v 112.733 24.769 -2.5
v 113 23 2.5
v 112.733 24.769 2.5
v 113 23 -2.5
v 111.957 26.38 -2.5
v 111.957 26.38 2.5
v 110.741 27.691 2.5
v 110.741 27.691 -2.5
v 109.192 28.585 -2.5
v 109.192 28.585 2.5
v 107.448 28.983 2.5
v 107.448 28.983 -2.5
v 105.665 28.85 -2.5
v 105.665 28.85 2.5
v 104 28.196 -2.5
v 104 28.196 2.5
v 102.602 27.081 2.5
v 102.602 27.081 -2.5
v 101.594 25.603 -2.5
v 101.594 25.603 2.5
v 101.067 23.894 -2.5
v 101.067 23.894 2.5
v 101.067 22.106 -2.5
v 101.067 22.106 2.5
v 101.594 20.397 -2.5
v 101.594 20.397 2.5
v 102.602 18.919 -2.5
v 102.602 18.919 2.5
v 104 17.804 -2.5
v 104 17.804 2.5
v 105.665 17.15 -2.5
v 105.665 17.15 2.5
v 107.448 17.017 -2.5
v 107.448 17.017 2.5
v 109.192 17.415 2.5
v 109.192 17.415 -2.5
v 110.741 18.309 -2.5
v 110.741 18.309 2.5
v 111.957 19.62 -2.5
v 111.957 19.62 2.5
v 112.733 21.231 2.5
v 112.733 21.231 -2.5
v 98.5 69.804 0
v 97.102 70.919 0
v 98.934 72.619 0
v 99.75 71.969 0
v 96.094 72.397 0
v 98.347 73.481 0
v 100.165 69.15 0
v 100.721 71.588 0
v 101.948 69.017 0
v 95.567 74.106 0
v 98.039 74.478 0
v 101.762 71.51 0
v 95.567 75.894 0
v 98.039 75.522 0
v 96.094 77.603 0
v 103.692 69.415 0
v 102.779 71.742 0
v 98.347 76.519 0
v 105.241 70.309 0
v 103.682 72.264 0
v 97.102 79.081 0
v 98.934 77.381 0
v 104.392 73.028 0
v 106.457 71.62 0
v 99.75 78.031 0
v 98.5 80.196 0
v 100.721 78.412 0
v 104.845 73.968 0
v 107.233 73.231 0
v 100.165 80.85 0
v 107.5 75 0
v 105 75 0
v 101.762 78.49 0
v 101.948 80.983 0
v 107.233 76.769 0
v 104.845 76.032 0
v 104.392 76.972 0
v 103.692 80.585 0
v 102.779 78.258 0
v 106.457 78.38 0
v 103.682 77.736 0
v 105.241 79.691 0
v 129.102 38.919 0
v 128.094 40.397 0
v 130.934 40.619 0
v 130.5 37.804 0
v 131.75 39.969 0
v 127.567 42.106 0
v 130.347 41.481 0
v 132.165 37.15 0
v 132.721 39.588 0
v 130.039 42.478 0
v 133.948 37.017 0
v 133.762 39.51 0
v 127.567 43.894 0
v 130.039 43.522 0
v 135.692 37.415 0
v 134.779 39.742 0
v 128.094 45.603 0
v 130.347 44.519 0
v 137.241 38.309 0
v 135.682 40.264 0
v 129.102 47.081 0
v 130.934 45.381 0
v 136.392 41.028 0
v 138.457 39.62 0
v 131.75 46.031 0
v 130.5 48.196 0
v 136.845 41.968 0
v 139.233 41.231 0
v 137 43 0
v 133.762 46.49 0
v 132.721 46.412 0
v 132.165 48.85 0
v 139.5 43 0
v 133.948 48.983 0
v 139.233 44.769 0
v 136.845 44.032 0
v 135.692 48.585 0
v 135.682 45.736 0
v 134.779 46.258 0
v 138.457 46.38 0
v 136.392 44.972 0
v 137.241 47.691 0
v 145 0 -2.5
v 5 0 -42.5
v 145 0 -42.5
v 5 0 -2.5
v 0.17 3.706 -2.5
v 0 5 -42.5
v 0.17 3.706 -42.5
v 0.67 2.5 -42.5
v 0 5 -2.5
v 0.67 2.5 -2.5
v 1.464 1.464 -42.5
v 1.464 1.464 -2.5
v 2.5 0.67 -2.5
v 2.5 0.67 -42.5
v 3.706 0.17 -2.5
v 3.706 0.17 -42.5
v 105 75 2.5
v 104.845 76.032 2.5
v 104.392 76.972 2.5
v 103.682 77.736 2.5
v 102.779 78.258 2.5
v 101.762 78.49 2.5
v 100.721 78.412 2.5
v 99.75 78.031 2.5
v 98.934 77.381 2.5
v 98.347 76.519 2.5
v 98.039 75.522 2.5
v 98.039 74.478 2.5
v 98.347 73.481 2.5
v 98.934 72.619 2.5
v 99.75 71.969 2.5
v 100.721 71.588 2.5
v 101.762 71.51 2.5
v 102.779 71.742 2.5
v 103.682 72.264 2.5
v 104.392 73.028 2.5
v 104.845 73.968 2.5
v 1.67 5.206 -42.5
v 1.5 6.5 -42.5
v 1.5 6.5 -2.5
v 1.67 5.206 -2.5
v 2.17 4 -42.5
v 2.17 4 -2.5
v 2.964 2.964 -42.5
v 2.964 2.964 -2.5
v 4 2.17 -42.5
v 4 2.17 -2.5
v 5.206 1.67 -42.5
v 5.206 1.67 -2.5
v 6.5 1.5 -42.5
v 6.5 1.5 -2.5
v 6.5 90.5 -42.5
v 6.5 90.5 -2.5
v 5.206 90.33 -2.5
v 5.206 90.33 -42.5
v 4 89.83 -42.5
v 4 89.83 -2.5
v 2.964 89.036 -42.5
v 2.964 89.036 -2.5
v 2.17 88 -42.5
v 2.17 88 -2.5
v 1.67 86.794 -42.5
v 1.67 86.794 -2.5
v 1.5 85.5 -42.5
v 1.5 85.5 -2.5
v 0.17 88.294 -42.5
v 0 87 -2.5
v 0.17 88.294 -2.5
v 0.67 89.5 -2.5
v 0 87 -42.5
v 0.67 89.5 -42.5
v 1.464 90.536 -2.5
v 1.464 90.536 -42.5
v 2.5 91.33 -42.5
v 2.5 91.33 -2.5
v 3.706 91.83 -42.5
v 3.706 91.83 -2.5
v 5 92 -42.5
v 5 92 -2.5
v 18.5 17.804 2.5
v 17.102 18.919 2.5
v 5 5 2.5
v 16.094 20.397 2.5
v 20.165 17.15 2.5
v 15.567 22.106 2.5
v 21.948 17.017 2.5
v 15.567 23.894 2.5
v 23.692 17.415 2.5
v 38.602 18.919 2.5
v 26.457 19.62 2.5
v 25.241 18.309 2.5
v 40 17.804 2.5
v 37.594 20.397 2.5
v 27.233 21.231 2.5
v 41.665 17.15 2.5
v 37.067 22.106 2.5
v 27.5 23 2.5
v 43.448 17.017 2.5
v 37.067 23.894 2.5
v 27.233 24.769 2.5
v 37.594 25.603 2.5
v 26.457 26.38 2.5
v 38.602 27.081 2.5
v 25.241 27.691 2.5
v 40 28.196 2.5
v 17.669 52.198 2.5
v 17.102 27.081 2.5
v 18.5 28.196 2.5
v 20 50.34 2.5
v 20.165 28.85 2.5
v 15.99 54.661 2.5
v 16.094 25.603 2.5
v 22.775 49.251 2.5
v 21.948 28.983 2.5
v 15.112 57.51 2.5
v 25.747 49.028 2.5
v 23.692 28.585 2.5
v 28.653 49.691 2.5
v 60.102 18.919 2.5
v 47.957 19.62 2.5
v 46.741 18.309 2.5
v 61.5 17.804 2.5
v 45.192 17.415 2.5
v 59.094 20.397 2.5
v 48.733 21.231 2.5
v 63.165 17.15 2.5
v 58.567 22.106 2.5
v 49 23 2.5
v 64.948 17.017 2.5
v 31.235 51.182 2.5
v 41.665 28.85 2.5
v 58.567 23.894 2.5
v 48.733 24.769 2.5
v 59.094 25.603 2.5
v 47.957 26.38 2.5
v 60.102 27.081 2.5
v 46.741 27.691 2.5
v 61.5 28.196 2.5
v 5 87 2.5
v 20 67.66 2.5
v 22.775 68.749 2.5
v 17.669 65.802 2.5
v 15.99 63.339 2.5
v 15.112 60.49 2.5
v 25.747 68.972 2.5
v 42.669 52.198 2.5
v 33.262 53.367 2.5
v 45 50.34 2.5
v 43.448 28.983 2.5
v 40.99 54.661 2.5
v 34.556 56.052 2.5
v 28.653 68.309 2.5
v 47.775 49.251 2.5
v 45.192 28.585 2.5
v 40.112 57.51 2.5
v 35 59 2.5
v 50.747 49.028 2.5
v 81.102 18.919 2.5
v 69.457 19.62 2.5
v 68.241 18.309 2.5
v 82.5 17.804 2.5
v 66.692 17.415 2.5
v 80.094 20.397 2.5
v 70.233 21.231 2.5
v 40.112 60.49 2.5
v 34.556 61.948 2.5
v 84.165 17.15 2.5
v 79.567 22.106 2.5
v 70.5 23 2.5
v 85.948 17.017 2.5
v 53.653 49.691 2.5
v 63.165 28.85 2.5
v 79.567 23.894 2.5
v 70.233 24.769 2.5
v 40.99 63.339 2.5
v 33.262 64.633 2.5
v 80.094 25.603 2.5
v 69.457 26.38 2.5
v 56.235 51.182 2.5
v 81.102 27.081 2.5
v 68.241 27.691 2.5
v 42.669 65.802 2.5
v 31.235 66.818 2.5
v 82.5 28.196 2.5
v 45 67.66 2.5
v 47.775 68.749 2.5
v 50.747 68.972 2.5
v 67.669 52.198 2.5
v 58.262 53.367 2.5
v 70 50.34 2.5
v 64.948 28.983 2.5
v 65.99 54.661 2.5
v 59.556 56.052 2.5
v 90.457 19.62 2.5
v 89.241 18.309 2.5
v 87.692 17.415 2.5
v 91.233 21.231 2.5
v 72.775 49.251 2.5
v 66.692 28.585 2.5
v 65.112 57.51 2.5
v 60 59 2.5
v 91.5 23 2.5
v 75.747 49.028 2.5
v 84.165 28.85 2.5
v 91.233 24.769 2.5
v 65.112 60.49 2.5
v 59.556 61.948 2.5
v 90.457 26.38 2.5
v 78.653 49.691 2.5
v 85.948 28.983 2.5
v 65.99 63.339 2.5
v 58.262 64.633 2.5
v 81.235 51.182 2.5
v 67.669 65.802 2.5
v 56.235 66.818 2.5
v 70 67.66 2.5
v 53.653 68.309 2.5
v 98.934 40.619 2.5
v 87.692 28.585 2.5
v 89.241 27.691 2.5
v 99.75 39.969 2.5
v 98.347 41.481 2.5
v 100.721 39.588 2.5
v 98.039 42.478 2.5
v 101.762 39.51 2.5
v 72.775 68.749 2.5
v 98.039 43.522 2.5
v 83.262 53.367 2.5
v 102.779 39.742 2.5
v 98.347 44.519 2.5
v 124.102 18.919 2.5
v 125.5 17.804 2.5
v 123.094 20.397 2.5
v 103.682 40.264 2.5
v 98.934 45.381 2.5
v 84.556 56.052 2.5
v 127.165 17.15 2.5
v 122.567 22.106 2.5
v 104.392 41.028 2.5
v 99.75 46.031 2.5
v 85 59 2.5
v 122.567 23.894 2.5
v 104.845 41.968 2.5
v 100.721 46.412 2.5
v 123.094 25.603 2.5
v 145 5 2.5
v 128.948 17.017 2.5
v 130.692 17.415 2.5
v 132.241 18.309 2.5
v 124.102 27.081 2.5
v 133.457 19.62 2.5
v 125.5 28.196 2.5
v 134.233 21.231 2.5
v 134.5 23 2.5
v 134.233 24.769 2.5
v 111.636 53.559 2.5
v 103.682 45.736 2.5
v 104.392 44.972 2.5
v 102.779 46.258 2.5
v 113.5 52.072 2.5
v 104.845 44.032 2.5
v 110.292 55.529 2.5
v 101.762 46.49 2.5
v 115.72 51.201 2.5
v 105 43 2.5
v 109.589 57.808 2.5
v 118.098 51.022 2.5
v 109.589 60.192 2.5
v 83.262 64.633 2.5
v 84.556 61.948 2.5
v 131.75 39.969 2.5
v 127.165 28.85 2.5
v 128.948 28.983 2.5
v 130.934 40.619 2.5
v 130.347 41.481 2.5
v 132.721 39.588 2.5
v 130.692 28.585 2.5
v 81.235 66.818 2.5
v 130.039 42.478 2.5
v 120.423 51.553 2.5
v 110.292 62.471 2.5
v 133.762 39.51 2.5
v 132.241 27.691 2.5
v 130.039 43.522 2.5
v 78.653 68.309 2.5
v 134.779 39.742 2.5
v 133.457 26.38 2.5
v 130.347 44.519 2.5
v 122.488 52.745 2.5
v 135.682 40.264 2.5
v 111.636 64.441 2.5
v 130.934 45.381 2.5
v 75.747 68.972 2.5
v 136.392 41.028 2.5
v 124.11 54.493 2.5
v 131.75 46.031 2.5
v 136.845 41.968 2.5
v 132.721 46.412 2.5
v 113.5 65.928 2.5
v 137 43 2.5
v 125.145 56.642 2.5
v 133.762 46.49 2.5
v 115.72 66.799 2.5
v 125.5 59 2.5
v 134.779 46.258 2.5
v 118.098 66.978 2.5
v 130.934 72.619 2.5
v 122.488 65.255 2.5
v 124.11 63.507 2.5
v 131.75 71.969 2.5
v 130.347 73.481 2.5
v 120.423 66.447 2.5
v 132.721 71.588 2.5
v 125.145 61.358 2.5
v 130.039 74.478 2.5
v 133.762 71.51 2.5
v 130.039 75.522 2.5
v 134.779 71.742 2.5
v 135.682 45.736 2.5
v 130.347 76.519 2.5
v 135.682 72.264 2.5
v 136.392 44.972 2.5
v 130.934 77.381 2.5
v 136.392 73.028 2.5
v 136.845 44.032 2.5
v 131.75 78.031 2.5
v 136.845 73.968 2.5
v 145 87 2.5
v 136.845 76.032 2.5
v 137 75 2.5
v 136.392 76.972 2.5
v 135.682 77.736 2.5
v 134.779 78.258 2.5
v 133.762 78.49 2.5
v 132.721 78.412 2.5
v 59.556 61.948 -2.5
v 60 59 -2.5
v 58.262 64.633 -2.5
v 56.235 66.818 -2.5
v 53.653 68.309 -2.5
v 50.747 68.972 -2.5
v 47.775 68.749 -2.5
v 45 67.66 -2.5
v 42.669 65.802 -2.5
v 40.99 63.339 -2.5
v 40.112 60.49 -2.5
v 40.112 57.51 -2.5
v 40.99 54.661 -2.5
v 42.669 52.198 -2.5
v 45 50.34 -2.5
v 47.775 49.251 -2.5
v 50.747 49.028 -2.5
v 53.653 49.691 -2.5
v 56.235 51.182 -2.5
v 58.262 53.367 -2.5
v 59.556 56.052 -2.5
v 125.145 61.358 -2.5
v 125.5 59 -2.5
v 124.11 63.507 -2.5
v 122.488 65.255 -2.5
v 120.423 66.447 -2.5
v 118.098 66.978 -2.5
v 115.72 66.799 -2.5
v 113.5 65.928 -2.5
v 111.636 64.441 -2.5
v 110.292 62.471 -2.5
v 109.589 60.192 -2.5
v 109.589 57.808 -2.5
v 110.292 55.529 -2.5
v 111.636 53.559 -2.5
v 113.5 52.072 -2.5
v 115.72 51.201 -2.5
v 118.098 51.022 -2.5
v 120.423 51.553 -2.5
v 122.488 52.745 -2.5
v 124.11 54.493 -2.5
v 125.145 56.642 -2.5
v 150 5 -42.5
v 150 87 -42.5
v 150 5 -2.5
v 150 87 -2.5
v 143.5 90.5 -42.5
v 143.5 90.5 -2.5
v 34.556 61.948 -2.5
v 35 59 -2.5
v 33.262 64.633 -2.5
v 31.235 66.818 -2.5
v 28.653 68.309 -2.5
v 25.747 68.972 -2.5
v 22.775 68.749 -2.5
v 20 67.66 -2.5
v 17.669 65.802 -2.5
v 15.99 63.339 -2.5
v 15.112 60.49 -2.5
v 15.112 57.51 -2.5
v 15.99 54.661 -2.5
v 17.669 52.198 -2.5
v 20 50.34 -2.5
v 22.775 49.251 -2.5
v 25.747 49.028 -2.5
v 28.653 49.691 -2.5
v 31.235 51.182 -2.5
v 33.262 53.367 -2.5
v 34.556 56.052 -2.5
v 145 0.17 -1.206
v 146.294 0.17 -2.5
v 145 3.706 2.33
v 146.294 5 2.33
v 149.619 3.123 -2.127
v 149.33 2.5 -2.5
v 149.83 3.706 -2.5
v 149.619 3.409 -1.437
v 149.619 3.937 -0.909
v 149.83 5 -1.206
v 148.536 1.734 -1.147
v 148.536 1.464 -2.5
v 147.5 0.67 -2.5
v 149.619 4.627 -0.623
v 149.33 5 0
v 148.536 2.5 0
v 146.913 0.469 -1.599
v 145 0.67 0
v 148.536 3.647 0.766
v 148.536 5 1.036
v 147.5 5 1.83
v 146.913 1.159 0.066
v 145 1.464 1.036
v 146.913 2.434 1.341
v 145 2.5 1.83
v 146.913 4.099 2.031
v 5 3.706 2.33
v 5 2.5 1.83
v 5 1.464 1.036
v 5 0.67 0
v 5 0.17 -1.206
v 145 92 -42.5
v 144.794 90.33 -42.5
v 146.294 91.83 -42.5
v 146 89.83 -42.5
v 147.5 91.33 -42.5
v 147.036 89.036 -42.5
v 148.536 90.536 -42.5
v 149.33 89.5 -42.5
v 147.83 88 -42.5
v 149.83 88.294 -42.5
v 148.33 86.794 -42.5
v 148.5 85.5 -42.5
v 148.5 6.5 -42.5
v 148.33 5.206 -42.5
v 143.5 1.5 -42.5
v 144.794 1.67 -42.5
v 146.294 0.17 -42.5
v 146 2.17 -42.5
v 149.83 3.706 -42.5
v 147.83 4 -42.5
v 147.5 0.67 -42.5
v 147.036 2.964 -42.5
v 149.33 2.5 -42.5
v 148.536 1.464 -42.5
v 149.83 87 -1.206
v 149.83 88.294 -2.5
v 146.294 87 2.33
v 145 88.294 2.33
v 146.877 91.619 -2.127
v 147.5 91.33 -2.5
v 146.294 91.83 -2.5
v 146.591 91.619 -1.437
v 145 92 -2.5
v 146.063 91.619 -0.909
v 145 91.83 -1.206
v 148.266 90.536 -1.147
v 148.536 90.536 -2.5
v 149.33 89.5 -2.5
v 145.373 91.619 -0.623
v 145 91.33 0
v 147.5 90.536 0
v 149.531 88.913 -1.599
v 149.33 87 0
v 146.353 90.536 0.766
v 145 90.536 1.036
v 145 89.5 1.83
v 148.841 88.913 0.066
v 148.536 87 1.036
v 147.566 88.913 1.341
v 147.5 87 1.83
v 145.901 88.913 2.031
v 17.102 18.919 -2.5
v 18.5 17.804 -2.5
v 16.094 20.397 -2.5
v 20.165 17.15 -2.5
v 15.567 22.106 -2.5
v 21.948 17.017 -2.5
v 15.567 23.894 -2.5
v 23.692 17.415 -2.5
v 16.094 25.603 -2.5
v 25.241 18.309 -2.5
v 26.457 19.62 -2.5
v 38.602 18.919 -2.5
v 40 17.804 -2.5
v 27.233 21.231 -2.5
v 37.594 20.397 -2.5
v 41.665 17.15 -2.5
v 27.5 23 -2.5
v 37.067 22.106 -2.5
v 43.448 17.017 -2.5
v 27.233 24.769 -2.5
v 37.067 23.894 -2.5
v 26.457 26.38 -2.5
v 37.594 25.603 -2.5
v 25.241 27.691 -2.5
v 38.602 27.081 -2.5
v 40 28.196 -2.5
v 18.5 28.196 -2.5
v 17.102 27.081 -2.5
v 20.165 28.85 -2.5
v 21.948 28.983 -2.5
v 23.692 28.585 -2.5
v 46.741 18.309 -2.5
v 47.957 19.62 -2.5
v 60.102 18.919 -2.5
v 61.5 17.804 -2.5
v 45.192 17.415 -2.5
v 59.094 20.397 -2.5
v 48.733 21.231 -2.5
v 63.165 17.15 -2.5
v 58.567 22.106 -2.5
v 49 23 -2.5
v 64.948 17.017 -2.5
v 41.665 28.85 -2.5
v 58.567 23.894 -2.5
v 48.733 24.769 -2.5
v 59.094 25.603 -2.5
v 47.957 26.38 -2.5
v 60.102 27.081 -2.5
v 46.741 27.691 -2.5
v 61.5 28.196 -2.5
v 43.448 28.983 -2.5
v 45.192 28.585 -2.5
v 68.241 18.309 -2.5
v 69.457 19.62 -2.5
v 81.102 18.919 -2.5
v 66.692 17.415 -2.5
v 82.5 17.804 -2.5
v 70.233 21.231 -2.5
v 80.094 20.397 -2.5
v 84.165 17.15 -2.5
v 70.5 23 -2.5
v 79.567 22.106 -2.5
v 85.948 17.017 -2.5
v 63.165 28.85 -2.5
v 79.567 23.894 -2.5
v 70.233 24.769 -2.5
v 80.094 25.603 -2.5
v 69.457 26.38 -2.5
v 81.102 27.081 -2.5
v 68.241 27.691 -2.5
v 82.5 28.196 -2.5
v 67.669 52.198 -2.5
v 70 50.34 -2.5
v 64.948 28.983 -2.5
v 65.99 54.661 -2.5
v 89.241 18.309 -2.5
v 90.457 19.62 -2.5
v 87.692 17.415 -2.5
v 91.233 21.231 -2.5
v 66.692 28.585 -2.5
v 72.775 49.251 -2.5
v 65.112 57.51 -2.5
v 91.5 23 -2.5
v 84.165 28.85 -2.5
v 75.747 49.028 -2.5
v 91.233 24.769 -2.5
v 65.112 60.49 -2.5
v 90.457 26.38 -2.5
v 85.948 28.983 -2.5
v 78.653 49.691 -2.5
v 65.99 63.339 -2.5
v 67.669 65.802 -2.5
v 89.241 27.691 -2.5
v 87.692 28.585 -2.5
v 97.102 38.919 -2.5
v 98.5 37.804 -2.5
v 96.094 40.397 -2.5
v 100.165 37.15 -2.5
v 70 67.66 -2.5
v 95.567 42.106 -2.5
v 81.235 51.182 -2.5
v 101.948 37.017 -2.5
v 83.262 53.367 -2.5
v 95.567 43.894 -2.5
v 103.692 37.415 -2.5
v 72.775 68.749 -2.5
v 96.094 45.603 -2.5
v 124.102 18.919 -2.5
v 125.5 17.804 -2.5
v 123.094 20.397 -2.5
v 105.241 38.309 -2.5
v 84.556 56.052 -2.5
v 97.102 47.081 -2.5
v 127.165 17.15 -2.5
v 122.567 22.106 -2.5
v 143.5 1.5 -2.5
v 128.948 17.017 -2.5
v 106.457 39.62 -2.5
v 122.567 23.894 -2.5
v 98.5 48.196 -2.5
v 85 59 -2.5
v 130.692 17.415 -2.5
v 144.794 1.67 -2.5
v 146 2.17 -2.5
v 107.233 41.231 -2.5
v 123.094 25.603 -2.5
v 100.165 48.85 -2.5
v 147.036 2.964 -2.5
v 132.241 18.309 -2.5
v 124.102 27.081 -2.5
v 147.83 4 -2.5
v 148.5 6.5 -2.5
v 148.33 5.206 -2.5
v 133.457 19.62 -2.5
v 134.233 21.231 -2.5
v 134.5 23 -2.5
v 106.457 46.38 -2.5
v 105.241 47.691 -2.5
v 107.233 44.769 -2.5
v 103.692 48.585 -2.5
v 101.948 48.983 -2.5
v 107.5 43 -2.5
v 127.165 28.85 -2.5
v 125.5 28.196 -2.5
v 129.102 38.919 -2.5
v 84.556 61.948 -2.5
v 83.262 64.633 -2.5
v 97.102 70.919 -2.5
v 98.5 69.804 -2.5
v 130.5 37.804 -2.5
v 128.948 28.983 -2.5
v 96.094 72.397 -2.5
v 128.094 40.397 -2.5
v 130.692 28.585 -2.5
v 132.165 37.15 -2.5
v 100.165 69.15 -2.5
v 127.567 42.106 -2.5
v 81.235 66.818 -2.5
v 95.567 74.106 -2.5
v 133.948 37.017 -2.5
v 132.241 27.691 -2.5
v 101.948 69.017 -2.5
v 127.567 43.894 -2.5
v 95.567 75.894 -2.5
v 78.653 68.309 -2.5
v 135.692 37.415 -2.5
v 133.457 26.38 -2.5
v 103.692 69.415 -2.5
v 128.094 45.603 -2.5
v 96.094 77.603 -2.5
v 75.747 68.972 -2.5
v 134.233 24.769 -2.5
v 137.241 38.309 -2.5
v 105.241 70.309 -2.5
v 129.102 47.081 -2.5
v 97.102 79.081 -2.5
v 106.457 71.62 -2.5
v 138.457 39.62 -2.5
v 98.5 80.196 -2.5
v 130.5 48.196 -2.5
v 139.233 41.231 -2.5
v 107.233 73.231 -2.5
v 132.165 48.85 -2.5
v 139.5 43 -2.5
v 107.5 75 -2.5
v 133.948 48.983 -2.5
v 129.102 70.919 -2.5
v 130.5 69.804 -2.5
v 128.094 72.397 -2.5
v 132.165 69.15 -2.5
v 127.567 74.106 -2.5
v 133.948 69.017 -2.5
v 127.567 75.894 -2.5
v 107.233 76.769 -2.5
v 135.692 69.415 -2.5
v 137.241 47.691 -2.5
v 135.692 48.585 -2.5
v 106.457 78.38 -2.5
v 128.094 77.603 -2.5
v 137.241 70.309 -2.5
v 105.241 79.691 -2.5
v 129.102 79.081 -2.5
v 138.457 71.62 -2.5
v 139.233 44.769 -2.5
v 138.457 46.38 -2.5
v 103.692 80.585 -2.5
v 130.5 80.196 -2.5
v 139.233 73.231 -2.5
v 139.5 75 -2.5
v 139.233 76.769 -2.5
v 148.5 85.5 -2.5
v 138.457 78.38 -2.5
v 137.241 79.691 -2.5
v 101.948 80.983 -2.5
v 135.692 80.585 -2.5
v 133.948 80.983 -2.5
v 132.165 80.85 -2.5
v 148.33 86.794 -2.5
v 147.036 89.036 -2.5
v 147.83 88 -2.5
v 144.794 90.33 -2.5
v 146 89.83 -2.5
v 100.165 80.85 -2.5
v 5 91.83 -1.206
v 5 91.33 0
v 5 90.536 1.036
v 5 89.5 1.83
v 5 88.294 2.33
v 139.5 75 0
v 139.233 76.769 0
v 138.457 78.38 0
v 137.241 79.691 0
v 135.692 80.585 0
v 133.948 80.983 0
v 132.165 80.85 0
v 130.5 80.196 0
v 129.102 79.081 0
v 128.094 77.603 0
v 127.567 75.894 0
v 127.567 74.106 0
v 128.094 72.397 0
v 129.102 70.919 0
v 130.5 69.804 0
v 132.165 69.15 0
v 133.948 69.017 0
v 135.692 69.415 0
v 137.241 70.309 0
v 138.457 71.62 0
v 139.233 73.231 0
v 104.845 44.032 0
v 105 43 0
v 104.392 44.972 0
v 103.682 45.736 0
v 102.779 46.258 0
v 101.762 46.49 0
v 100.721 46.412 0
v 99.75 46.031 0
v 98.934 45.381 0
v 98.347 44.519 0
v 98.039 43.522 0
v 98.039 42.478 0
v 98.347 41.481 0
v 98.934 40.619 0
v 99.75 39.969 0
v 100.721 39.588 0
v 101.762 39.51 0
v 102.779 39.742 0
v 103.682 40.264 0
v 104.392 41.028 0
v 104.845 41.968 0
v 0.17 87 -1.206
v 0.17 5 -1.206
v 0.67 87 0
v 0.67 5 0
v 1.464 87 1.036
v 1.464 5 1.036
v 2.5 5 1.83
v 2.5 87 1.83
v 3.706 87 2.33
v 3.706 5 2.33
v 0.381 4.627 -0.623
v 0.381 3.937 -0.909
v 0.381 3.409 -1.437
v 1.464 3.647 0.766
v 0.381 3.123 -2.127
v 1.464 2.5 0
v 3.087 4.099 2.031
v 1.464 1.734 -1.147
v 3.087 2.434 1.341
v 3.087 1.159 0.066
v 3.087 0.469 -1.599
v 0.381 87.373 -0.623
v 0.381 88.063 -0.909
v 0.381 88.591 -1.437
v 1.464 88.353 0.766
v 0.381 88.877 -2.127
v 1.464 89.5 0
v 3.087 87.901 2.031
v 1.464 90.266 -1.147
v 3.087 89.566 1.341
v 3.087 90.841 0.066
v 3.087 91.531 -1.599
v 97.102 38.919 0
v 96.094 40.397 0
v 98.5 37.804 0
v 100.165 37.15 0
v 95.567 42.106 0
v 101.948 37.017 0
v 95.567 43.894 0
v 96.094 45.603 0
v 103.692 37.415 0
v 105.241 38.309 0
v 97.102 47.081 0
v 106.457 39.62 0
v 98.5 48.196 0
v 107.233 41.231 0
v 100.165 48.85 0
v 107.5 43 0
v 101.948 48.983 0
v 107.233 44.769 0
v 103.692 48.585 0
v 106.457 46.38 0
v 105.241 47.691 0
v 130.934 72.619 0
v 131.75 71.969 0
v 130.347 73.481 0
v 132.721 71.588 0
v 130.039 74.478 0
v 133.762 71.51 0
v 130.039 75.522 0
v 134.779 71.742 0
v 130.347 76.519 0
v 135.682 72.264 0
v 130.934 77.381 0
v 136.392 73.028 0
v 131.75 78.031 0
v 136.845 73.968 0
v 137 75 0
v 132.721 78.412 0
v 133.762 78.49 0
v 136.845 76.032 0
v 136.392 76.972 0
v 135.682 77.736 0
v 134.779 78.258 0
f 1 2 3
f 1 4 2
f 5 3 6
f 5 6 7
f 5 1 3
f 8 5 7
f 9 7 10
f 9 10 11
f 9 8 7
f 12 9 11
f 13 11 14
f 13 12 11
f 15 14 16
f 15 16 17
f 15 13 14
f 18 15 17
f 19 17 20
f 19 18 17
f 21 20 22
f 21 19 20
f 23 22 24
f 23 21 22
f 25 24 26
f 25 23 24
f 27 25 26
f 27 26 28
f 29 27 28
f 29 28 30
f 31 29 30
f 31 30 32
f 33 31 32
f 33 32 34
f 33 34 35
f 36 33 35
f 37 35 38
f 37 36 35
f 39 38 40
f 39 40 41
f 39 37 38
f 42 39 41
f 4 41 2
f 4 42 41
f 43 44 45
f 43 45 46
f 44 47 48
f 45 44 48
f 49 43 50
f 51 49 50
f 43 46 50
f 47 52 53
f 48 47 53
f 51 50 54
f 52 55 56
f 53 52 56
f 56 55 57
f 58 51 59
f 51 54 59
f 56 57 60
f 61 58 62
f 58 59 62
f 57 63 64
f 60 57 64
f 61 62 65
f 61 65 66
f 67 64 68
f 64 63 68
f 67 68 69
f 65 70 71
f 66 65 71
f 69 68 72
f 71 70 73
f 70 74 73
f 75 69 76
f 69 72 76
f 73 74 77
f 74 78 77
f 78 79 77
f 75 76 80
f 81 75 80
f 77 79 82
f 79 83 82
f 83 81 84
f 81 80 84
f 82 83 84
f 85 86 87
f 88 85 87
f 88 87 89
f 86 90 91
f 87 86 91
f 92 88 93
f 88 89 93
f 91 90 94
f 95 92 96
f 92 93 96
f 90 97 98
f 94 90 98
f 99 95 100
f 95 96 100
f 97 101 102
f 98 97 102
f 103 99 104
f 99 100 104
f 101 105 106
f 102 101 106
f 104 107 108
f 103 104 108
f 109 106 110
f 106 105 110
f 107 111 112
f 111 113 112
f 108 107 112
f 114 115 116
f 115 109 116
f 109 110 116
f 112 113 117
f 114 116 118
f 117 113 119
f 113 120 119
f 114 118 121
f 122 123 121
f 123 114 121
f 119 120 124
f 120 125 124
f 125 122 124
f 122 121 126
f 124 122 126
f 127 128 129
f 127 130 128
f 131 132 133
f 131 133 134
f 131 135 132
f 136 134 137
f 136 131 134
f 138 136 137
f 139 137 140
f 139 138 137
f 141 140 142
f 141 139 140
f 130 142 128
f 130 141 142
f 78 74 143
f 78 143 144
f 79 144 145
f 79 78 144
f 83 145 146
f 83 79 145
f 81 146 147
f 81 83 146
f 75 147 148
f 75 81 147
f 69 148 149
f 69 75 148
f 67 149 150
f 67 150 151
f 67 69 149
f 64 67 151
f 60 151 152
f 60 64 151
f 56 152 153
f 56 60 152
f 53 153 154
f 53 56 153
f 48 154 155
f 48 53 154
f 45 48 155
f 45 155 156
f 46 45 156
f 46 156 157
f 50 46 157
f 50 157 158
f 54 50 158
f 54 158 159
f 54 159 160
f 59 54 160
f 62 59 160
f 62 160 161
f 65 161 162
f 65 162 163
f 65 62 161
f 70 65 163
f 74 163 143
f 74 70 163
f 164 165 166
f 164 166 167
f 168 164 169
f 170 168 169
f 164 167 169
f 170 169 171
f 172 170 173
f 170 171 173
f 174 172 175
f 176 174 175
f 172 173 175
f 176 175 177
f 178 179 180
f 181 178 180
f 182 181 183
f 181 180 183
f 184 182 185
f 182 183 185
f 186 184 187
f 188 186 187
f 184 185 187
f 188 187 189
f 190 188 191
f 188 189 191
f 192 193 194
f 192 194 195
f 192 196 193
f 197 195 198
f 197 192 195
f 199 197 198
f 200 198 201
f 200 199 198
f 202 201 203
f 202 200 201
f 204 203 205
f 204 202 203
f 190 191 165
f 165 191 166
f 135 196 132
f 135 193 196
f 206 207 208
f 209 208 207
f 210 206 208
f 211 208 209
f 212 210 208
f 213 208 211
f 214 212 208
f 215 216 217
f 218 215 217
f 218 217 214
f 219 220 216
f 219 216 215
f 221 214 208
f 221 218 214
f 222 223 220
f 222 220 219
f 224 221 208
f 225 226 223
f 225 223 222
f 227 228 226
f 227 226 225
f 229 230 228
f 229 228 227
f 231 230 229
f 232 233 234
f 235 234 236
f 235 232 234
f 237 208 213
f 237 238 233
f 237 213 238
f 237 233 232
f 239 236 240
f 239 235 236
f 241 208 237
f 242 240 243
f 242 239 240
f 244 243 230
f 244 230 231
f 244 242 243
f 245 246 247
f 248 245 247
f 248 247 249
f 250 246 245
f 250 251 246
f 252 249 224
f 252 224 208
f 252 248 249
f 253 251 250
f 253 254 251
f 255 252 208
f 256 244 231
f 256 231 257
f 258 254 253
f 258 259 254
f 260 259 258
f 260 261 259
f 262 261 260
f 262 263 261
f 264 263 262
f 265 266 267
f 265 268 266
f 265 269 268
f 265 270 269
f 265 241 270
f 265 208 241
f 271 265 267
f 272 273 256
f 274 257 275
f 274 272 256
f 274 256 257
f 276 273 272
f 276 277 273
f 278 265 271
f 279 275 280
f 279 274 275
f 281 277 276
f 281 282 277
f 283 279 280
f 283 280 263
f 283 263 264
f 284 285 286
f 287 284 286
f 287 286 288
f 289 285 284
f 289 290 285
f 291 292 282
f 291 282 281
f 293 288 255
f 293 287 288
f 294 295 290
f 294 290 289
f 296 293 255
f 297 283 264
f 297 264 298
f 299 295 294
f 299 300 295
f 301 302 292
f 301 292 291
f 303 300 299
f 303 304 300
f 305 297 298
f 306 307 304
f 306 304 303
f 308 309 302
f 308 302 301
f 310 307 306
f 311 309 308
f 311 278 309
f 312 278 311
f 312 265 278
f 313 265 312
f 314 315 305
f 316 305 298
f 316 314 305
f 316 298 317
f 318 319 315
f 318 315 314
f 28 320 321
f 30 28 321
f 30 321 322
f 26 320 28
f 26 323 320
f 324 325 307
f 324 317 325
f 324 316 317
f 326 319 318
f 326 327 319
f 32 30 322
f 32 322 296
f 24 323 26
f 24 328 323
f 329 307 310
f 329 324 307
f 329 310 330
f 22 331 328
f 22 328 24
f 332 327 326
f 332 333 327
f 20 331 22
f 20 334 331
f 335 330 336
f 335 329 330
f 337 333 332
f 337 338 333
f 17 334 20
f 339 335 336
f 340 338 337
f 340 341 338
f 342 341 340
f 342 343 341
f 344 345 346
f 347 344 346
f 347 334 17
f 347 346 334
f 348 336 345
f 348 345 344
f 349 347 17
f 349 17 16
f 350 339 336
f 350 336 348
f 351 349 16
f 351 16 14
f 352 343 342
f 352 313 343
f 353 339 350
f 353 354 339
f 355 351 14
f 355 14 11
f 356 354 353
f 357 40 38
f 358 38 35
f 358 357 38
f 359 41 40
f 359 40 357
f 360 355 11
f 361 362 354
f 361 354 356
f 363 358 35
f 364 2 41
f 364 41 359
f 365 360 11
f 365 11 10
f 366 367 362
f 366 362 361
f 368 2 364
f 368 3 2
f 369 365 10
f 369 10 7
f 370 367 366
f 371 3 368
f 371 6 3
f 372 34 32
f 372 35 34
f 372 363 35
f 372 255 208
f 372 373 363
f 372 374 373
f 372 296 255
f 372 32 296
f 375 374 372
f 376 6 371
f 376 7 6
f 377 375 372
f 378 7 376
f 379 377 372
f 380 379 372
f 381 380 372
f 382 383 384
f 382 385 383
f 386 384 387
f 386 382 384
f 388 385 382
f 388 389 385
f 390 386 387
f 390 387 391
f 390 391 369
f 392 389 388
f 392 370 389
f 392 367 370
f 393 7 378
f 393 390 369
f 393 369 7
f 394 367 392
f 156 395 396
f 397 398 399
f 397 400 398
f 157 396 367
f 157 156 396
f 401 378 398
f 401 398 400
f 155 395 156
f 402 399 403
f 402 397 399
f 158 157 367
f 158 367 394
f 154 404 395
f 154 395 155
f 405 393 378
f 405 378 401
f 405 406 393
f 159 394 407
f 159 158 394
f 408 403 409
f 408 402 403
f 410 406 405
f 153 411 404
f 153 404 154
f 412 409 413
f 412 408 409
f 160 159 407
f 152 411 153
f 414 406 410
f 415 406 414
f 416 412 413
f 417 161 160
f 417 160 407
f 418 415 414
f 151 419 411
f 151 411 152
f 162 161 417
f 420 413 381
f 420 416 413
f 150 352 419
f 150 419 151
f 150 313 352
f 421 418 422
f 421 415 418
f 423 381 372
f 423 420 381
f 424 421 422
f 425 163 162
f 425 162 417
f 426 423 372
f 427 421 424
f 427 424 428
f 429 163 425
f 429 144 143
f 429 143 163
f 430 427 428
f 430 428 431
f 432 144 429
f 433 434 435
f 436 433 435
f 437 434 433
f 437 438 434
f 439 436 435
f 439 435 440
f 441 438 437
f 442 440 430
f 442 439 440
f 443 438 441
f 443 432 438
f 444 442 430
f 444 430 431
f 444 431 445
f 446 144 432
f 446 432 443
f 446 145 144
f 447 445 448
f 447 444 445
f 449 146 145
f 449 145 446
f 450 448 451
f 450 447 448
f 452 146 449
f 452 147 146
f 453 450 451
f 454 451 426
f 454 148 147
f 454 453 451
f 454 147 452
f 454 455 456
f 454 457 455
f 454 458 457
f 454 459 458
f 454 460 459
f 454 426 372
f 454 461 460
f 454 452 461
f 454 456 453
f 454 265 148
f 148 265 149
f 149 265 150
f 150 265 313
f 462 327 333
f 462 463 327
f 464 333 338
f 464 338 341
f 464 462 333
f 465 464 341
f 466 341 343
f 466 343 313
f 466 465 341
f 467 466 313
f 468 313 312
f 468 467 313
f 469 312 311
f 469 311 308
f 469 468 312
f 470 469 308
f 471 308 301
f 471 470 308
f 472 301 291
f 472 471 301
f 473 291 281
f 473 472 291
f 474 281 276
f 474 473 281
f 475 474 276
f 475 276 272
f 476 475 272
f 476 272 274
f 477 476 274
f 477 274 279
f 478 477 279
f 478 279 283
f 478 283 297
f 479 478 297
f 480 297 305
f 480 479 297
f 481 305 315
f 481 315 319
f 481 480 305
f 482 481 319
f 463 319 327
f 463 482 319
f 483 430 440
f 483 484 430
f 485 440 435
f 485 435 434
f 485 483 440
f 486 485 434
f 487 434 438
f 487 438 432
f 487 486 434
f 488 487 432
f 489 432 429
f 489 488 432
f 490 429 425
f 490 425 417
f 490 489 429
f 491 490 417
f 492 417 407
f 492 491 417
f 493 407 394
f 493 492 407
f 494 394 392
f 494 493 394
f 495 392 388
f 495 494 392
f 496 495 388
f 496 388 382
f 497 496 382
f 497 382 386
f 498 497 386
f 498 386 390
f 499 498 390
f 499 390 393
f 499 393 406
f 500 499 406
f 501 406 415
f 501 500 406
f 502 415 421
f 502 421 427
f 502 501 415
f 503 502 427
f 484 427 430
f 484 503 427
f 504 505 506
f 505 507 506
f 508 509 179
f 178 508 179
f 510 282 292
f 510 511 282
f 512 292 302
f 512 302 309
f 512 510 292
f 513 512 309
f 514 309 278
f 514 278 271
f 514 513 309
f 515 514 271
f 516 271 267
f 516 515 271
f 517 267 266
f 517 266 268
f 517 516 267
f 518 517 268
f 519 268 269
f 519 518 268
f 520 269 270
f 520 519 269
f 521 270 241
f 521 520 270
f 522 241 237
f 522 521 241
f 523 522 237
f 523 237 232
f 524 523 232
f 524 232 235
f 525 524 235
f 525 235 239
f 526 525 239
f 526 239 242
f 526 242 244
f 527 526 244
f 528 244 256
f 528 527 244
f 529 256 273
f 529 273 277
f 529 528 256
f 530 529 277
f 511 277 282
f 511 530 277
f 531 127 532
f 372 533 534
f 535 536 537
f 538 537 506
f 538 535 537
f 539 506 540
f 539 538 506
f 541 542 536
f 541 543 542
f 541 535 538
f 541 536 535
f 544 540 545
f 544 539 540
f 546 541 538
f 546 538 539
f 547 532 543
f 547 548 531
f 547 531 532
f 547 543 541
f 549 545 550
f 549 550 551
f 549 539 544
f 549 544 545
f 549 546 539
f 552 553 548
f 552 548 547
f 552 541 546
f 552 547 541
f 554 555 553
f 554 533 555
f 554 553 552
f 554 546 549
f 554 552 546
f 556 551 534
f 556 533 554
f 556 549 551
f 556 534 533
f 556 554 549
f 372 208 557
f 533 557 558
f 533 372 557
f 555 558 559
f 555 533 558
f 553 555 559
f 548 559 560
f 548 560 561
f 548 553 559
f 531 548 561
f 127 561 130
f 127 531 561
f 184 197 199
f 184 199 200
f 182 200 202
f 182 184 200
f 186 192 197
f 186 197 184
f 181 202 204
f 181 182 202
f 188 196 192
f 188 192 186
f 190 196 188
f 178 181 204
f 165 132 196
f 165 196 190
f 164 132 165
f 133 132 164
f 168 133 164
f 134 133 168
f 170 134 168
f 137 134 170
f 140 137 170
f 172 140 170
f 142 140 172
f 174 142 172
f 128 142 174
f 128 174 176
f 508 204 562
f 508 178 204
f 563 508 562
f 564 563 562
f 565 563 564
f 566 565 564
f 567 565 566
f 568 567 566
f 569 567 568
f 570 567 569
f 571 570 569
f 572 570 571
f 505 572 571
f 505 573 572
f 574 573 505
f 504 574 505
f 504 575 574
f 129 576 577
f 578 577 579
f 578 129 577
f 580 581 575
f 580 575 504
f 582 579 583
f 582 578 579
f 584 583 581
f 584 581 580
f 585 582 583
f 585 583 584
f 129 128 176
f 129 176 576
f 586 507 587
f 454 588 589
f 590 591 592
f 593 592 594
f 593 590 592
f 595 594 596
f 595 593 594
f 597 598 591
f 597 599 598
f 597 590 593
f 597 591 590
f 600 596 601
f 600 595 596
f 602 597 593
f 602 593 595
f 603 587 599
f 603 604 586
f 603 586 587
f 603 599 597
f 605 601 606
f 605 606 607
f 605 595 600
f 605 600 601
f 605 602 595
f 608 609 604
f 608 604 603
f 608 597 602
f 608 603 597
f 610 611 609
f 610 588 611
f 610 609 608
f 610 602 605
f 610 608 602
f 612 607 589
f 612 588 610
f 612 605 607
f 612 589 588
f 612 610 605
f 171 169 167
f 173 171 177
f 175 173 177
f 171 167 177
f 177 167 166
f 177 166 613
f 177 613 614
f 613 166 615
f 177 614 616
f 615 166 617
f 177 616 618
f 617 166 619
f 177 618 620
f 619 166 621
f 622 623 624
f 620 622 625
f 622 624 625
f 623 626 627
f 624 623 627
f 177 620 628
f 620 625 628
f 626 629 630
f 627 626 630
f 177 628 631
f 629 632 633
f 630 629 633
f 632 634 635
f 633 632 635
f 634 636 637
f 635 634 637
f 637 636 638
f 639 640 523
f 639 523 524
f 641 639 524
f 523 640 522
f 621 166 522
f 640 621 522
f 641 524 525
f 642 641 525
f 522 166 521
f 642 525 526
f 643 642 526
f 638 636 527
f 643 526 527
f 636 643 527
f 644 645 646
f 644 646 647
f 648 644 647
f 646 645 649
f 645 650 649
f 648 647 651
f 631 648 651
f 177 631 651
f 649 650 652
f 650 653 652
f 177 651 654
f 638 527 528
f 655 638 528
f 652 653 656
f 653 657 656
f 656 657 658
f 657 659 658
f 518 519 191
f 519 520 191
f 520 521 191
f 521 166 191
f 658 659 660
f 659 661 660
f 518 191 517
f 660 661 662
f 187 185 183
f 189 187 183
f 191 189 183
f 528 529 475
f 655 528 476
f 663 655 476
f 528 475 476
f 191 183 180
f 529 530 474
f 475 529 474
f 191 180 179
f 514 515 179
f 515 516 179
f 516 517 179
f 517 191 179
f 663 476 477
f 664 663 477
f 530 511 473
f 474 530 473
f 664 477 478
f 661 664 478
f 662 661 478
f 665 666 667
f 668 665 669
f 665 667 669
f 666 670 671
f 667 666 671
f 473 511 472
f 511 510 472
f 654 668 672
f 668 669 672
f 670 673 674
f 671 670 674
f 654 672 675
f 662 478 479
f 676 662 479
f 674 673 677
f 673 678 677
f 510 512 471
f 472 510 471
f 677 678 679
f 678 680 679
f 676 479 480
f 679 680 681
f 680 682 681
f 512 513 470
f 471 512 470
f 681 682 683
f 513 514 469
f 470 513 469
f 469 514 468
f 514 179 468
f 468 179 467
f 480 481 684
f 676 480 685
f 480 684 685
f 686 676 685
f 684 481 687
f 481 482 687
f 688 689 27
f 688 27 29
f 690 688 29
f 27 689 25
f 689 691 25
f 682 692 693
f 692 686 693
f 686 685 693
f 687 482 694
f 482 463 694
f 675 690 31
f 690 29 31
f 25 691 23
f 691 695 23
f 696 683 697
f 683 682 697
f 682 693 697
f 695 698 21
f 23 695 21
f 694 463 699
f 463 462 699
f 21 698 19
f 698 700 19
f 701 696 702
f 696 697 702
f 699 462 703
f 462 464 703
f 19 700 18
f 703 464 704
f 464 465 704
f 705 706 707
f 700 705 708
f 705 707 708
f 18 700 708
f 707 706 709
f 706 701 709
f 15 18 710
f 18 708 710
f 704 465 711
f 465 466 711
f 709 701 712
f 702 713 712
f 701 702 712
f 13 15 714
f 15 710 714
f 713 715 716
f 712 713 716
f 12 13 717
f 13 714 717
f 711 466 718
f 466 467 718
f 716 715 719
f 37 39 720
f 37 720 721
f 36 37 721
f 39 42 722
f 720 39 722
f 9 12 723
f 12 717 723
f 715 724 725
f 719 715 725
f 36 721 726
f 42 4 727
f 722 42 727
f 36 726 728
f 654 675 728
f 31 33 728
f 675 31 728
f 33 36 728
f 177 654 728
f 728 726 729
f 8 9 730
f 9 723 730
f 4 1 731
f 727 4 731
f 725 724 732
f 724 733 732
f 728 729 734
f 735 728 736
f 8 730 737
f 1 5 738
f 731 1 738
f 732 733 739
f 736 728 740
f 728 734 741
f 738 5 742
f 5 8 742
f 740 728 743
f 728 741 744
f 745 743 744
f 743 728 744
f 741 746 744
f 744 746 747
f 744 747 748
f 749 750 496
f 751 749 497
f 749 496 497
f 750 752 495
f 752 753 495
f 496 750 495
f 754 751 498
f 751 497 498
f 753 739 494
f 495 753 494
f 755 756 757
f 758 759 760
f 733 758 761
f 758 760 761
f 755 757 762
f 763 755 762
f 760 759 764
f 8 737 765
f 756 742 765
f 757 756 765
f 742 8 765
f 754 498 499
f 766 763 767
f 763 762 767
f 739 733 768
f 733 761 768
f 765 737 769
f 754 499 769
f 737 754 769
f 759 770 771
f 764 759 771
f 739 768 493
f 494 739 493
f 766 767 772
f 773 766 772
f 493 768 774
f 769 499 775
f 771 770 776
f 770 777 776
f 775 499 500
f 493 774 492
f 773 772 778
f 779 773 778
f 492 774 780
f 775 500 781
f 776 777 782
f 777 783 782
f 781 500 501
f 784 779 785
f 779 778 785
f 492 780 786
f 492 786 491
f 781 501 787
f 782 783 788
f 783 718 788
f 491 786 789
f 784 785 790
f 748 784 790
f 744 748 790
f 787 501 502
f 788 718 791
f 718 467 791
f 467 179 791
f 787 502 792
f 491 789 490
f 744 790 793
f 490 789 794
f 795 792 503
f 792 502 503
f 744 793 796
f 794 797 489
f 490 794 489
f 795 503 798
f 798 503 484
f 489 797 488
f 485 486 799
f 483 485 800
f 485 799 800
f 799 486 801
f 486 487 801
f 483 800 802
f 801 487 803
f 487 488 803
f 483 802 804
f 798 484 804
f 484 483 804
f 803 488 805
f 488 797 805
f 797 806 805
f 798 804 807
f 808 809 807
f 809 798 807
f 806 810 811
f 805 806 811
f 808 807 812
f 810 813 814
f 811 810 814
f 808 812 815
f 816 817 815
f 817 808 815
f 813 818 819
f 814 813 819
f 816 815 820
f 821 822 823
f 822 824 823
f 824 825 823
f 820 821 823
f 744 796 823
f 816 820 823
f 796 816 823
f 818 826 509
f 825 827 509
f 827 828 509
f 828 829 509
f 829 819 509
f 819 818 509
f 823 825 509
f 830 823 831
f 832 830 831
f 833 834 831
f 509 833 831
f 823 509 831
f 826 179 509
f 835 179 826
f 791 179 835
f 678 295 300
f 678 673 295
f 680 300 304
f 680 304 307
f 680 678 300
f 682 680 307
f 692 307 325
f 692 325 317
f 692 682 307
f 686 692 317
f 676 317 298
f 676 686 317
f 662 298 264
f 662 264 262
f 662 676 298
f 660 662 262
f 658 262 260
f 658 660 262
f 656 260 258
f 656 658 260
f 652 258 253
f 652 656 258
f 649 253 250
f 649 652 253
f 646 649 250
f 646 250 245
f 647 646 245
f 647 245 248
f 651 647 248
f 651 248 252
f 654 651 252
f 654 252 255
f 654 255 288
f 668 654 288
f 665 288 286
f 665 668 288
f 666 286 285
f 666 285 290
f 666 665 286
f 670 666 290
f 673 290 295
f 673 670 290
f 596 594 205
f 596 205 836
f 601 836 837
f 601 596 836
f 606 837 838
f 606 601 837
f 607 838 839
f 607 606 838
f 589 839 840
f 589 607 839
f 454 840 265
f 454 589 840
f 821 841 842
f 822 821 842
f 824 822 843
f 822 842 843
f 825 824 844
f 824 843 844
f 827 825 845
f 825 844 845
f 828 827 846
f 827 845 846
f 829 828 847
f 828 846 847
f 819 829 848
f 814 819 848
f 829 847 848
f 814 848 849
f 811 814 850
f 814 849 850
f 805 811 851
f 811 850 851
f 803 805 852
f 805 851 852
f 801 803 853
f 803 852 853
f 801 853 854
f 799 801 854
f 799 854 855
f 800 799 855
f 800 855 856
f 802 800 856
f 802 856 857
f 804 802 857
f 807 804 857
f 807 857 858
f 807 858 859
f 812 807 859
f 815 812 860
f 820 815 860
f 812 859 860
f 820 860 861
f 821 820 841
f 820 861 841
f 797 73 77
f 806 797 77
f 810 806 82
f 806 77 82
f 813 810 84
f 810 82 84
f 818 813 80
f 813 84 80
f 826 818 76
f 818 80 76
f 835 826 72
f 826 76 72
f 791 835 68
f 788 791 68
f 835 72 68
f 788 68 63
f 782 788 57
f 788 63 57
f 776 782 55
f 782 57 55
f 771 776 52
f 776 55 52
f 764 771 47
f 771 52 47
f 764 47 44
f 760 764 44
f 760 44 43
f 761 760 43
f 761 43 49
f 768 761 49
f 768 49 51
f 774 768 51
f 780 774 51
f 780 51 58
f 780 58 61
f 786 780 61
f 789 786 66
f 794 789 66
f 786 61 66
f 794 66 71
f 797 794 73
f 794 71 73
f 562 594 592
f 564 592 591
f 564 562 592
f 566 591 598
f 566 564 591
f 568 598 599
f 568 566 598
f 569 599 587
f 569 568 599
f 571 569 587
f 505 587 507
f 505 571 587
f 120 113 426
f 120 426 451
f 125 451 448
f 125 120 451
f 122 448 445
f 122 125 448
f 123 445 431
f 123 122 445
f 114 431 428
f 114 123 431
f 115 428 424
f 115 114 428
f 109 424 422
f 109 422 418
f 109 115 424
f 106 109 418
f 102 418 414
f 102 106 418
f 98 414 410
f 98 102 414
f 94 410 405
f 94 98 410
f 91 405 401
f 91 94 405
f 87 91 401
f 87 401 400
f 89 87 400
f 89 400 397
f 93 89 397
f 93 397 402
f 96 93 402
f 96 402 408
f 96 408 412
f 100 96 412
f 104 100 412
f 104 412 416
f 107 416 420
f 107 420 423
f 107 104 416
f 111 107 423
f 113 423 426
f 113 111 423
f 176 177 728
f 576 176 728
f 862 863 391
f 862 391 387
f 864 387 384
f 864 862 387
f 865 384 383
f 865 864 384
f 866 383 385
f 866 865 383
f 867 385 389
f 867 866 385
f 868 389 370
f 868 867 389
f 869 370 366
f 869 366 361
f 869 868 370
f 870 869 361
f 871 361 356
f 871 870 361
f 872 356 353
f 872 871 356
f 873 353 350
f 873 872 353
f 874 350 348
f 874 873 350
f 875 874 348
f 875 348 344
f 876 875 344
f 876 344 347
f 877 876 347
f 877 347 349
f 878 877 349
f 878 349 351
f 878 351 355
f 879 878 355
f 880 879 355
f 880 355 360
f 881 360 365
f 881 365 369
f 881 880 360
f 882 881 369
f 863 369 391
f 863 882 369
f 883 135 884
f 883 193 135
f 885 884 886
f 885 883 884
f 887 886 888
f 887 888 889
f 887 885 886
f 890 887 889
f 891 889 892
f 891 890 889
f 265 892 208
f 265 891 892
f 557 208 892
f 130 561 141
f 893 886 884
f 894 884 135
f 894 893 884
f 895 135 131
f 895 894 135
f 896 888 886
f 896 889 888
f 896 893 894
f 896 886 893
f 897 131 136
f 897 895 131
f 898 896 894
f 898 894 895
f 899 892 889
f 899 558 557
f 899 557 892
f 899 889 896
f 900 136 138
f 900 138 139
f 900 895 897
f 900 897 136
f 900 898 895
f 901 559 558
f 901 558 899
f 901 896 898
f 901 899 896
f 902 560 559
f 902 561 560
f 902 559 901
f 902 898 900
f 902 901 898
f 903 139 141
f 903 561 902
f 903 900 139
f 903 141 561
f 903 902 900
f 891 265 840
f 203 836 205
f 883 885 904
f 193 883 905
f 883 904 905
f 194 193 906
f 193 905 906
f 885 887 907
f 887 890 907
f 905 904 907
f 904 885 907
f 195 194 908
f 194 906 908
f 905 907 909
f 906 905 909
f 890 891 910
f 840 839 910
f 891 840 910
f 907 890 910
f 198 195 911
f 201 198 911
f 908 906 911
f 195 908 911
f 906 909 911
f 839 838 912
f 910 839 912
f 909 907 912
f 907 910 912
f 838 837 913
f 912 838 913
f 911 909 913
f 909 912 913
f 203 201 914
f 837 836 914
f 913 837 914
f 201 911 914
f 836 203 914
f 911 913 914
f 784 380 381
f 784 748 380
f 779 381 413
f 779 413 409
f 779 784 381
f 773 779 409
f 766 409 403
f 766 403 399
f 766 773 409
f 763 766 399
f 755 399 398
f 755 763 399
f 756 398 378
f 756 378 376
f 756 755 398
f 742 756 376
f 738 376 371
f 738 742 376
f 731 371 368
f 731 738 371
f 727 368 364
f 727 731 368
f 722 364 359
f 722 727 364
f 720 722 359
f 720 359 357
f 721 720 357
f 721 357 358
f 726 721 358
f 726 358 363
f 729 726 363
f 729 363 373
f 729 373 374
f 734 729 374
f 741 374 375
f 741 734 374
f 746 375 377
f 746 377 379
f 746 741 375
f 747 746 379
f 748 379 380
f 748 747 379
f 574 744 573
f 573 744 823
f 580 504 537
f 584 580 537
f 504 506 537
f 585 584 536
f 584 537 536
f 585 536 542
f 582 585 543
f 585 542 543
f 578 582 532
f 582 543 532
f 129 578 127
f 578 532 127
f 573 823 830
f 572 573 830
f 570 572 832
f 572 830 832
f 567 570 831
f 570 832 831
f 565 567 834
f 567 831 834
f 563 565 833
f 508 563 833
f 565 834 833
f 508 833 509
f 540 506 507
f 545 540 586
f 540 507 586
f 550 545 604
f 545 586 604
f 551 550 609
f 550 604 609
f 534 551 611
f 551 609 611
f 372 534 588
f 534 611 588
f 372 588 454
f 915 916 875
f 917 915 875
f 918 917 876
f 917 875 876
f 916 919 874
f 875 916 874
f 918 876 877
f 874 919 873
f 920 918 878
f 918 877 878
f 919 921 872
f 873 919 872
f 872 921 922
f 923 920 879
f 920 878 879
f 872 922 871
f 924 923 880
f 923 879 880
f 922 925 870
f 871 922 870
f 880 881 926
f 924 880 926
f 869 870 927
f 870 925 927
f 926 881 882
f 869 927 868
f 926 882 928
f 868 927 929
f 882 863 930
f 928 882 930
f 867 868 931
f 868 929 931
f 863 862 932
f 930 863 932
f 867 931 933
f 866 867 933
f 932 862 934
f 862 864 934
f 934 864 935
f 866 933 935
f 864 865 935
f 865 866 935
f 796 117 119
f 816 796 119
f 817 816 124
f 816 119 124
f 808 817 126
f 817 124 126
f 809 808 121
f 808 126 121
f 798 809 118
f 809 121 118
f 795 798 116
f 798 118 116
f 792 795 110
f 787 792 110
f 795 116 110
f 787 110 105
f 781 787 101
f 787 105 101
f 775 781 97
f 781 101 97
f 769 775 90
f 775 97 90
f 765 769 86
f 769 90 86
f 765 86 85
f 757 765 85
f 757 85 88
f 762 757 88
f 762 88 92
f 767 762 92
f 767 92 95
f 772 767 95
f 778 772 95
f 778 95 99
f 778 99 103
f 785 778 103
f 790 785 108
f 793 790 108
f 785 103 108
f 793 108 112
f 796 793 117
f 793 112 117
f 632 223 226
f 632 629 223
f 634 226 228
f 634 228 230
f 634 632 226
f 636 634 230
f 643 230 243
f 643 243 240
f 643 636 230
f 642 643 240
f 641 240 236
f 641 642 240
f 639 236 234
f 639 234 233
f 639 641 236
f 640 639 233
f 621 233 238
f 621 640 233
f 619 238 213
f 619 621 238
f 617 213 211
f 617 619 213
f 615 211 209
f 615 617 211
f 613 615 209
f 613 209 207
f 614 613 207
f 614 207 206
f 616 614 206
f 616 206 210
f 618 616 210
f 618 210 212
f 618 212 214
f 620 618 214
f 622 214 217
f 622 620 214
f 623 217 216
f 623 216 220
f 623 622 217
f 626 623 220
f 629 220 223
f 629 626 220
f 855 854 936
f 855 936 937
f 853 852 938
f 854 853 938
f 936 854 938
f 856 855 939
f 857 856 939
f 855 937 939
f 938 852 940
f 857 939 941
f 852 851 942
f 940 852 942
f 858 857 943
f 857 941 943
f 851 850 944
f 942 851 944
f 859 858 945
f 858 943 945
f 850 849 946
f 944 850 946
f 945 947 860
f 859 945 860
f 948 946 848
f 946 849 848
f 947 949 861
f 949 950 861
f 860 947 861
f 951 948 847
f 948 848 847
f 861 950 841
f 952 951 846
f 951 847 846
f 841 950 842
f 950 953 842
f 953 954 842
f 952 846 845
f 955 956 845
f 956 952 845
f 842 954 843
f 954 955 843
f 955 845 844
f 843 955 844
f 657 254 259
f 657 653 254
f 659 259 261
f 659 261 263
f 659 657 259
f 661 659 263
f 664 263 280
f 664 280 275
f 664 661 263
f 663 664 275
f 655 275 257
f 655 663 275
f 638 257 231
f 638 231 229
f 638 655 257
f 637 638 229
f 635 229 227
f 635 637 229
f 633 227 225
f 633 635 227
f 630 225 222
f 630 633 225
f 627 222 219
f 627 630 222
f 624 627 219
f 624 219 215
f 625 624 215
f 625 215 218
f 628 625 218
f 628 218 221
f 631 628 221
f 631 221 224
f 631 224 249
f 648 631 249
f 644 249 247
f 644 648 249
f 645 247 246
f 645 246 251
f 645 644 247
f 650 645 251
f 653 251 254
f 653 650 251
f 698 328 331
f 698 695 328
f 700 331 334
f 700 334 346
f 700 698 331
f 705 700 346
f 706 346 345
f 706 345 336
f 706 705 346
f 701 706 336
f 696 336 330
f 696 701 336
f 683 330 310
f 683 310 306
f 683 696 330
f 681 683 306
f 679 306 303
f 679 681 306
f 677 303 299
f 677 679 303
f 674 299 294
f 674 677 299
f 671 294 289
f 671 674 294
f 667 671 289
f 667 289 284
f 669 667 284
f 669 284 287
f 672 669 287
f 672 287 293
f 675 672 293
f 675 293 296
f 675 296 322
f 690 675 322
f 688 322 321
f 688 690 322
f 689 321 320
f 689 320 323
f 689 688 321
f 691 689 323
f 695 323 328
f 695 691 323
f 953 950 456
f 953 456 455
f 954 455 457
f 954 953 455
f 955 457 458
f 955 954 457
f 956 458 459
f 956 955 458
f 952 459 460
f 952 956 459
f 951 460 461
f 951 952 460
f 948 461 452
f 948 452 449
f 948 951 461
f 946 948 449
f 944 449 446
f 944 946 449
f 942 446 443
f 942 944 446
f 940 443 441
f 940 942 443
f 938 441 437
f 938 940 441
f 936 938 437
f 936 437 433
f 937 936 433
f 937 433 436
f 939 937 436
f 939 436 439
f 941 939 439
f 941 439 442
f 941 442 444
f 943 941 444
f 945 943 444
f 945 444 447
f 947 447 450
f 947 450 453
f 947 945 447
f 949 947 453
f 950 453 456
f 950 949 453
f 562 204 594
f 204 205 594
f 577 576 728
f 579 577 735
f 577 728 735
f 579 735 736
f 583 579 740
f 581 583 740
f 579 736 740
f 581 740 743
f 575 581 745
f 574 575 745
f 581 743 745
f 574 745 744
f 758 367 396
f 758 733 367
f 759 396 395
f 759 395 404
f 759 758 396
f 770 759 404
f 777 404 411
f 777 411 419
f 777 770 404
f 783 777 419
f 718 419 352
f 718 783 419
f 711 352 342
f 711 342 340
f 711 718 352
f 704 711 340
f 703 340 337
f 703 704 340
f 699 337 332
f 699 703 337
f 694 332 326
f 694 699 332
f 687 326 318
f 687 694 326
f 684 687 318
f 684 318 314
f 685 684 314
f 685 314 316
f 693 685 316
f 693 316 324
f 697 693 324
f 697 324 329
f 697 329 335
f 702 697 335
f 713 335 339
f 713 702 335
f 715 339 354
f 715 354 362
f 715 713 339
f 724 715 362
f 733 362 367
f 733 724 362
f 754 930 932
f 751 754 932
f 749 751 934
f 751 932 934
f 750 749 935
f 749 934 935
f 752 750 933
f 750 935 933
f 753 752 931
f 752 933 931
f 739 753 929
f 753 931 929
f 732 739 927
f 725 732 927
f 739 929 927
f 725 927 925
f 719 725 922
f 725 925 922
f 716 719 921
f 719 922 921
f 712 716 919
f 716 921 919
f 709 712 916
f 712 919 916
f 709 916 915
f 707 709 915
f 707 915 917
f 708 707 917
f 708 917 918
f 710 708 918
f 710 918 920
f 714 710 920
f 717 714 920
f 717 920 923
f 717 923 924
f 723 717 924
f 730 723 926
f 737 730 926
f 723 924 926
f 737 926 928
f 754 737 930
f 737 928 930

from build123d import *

# Parameters (mm, degrees)
F0_W     = 150
F0_H     = 92
F0_R     = 6
F0_R_2   = 3.5
F0_R_3   = 10
F0_R_4   = 8
F1_DEPTH = 2.5
F2_W     = 150
F2_H     = 92
F2_R     = 6
F2_R_2   = 10
F2_R_3   = 8
F3_DEPTH = 2.5
F4_W     = 150
F4_H     = 92
F5_DEPTH = 40
F6_R     = 5


with BuildPart() as f1:
    # F0 (on Top) → F1 (new body)
    with BuildSketch(Plane.XY):
        with Locations((75, 46)):
            Rectangle(F0_W, F0_H)
        with Locations((21.5, 23)):
            Circle(F0_R, mode=Mode.SUBTRACT)
        with Locations((43, 23)):
            Circle(F0_R, mode=Mode.SUBTRACT)
        with Locations((64.5, 23)):
            Circle(F0_R, mode=Mode.SUBTRACT)
        with Locations((85.5, 23)):
            Circle(F0_R, mode=Mode.SUBTRACT)
        with Locations((107, 23)):
            Circle(F0_R, mode=Mode.SUBTRACT)
        with Locations((101.5, 43)):
            Circle(F0_R_2, mode=Mode.SUBTRACT)
        with Locations((128.5, 23)):
            Circle(F0_R, mode=Mode.SUBTRACT)
        with Locations((133.5, 43)):
            Circle(F0_R_2, mode=Mode.SUBTRACT)
        with Locations((25, 59)):
            Circle(F0_R_3, mode=Mode.SUBTRACT)
        with Locations((50, 59)):
            Circle(F0_R_3, mode=Mode.SUBTRACT)
        with Locations((75, 59)):
            Circle(F0_R_3, mode=Mode.SUBTRACT)
        with Locations((117.5, 59)):
            Circle(F0_R_4, mode=Mode.SUBTRACT)
        with Locations((101.5, 75)):
            Circle(F0_R_2, mode=Mode.SUBTRACT)
        with Locations((133.5, 75)):
            Circle(F0_R_2, mode=Mode.SUBTRACT)
    extrude(amount=F1_DEPTH)

    # F2 (on face) → F3 (join)
    with BuildSketch(Plane.XY):
        with Locations((75, 46)):
            Rectangle(F2_W, F2_H)
        with Locations((21.5, 23)):
            Circle(F2_R, mode=Mode.SUBTRACT)
        with Locations((43, 23)):
            Circle(F2_R, mode=Mode.SUBTRACT)
        with Locations((64.5, 23)):
            Circle(F2_R, mode=Mode.SUBTRACT)
        with Locations((85.5, 23)):
            Circle(F2_R, mode=Mode.SUBTRACT)
        with Locations((107, 23)):
            Circle(F2_R, mode=Mode.SUBTRACT)
        with Locations((101.5, 43)):
            Circle(F2_R, mode=Mode.SUBTRACT)
        with Locations((128.5, 23)):
            Circle(F2_R, mode=Mode.SUBTRACT)
        with Locations((133.5, 43)):
            Circle(F2_R, mode=Mode.SUBTRACT)
        with Locations((25, 59)):
            Circle(F2_R_2, mode=Mode.SUBTRACT)
        with Locations((50, 59)):
            Circle(F2_R_2, mode=Mode.SUBTRACT)
        with Locations((75, 59)):
            Circle(F2_R_2, mode=Mode.SUBTRACT)
        with Locations((117.5, 59)):
            Circle(F2_R_3, mode=Mode.SUBTRACT)
        with Locations((101.5, 75)):
            Circle(F2_R, mode=Mode.SUBTRACT)
        with Locations((133.5, 75)):
            Circle(F2_R, mode=Mode.SUBTRACT)
    extrude(amount=-F3_DEPTH)

    # F4 (on face) → F5 (join)
    with BuildSketch(Plane(origin=(0, 0, -2.5), x_dir=(1, 0, 0), z_dir=(0, 0, -1))):
        with Locations((75, -46)):
            Rectangle(F4_W, F4_H)
        with BuildLine():
            ThreePointArc((1.5, -6.5), (2.964466, -2.964466), (6.5, -1.5))
            Line((6.5, -1.5), (143.5, -1.5))
            ThreePointArc((143.5, -1.5), (147.035534, -2.964466), (148.5, -6.5))
            Line((148.5, -6.5), (148.5, -85.5))
            ThreePointArc((148.5, -85.5), (147.035534, -89.035534), (143.5, -90.5))
            Line((143.5, -90.5), (6.5, -90.5))
            ThreePointArc((6.5, -90.5), (2.964466, -89.035534), (1.5, -85.5))
            Line((1.5, -85.5), (1.5, -6.5))
        make_face(mode=Mode.SUBTRACT)
    extrude(amount=F5_DEPTH)

    # F6
    f6_edges = [f1.edges().sort_by_distance(p)[0] for p in [
        (75, 0, 2.5),
        (150, 0, -20),
        (150, 46, 2.5),
        (150, 92, -20),
        (75, 92, 2.5),
        (0, 46, 2.5),
        (0, 92, -20),
        (0, 0, -20),
    ]]
    fillet(f6_edges, radius=F6_R)


solid = f1.part
